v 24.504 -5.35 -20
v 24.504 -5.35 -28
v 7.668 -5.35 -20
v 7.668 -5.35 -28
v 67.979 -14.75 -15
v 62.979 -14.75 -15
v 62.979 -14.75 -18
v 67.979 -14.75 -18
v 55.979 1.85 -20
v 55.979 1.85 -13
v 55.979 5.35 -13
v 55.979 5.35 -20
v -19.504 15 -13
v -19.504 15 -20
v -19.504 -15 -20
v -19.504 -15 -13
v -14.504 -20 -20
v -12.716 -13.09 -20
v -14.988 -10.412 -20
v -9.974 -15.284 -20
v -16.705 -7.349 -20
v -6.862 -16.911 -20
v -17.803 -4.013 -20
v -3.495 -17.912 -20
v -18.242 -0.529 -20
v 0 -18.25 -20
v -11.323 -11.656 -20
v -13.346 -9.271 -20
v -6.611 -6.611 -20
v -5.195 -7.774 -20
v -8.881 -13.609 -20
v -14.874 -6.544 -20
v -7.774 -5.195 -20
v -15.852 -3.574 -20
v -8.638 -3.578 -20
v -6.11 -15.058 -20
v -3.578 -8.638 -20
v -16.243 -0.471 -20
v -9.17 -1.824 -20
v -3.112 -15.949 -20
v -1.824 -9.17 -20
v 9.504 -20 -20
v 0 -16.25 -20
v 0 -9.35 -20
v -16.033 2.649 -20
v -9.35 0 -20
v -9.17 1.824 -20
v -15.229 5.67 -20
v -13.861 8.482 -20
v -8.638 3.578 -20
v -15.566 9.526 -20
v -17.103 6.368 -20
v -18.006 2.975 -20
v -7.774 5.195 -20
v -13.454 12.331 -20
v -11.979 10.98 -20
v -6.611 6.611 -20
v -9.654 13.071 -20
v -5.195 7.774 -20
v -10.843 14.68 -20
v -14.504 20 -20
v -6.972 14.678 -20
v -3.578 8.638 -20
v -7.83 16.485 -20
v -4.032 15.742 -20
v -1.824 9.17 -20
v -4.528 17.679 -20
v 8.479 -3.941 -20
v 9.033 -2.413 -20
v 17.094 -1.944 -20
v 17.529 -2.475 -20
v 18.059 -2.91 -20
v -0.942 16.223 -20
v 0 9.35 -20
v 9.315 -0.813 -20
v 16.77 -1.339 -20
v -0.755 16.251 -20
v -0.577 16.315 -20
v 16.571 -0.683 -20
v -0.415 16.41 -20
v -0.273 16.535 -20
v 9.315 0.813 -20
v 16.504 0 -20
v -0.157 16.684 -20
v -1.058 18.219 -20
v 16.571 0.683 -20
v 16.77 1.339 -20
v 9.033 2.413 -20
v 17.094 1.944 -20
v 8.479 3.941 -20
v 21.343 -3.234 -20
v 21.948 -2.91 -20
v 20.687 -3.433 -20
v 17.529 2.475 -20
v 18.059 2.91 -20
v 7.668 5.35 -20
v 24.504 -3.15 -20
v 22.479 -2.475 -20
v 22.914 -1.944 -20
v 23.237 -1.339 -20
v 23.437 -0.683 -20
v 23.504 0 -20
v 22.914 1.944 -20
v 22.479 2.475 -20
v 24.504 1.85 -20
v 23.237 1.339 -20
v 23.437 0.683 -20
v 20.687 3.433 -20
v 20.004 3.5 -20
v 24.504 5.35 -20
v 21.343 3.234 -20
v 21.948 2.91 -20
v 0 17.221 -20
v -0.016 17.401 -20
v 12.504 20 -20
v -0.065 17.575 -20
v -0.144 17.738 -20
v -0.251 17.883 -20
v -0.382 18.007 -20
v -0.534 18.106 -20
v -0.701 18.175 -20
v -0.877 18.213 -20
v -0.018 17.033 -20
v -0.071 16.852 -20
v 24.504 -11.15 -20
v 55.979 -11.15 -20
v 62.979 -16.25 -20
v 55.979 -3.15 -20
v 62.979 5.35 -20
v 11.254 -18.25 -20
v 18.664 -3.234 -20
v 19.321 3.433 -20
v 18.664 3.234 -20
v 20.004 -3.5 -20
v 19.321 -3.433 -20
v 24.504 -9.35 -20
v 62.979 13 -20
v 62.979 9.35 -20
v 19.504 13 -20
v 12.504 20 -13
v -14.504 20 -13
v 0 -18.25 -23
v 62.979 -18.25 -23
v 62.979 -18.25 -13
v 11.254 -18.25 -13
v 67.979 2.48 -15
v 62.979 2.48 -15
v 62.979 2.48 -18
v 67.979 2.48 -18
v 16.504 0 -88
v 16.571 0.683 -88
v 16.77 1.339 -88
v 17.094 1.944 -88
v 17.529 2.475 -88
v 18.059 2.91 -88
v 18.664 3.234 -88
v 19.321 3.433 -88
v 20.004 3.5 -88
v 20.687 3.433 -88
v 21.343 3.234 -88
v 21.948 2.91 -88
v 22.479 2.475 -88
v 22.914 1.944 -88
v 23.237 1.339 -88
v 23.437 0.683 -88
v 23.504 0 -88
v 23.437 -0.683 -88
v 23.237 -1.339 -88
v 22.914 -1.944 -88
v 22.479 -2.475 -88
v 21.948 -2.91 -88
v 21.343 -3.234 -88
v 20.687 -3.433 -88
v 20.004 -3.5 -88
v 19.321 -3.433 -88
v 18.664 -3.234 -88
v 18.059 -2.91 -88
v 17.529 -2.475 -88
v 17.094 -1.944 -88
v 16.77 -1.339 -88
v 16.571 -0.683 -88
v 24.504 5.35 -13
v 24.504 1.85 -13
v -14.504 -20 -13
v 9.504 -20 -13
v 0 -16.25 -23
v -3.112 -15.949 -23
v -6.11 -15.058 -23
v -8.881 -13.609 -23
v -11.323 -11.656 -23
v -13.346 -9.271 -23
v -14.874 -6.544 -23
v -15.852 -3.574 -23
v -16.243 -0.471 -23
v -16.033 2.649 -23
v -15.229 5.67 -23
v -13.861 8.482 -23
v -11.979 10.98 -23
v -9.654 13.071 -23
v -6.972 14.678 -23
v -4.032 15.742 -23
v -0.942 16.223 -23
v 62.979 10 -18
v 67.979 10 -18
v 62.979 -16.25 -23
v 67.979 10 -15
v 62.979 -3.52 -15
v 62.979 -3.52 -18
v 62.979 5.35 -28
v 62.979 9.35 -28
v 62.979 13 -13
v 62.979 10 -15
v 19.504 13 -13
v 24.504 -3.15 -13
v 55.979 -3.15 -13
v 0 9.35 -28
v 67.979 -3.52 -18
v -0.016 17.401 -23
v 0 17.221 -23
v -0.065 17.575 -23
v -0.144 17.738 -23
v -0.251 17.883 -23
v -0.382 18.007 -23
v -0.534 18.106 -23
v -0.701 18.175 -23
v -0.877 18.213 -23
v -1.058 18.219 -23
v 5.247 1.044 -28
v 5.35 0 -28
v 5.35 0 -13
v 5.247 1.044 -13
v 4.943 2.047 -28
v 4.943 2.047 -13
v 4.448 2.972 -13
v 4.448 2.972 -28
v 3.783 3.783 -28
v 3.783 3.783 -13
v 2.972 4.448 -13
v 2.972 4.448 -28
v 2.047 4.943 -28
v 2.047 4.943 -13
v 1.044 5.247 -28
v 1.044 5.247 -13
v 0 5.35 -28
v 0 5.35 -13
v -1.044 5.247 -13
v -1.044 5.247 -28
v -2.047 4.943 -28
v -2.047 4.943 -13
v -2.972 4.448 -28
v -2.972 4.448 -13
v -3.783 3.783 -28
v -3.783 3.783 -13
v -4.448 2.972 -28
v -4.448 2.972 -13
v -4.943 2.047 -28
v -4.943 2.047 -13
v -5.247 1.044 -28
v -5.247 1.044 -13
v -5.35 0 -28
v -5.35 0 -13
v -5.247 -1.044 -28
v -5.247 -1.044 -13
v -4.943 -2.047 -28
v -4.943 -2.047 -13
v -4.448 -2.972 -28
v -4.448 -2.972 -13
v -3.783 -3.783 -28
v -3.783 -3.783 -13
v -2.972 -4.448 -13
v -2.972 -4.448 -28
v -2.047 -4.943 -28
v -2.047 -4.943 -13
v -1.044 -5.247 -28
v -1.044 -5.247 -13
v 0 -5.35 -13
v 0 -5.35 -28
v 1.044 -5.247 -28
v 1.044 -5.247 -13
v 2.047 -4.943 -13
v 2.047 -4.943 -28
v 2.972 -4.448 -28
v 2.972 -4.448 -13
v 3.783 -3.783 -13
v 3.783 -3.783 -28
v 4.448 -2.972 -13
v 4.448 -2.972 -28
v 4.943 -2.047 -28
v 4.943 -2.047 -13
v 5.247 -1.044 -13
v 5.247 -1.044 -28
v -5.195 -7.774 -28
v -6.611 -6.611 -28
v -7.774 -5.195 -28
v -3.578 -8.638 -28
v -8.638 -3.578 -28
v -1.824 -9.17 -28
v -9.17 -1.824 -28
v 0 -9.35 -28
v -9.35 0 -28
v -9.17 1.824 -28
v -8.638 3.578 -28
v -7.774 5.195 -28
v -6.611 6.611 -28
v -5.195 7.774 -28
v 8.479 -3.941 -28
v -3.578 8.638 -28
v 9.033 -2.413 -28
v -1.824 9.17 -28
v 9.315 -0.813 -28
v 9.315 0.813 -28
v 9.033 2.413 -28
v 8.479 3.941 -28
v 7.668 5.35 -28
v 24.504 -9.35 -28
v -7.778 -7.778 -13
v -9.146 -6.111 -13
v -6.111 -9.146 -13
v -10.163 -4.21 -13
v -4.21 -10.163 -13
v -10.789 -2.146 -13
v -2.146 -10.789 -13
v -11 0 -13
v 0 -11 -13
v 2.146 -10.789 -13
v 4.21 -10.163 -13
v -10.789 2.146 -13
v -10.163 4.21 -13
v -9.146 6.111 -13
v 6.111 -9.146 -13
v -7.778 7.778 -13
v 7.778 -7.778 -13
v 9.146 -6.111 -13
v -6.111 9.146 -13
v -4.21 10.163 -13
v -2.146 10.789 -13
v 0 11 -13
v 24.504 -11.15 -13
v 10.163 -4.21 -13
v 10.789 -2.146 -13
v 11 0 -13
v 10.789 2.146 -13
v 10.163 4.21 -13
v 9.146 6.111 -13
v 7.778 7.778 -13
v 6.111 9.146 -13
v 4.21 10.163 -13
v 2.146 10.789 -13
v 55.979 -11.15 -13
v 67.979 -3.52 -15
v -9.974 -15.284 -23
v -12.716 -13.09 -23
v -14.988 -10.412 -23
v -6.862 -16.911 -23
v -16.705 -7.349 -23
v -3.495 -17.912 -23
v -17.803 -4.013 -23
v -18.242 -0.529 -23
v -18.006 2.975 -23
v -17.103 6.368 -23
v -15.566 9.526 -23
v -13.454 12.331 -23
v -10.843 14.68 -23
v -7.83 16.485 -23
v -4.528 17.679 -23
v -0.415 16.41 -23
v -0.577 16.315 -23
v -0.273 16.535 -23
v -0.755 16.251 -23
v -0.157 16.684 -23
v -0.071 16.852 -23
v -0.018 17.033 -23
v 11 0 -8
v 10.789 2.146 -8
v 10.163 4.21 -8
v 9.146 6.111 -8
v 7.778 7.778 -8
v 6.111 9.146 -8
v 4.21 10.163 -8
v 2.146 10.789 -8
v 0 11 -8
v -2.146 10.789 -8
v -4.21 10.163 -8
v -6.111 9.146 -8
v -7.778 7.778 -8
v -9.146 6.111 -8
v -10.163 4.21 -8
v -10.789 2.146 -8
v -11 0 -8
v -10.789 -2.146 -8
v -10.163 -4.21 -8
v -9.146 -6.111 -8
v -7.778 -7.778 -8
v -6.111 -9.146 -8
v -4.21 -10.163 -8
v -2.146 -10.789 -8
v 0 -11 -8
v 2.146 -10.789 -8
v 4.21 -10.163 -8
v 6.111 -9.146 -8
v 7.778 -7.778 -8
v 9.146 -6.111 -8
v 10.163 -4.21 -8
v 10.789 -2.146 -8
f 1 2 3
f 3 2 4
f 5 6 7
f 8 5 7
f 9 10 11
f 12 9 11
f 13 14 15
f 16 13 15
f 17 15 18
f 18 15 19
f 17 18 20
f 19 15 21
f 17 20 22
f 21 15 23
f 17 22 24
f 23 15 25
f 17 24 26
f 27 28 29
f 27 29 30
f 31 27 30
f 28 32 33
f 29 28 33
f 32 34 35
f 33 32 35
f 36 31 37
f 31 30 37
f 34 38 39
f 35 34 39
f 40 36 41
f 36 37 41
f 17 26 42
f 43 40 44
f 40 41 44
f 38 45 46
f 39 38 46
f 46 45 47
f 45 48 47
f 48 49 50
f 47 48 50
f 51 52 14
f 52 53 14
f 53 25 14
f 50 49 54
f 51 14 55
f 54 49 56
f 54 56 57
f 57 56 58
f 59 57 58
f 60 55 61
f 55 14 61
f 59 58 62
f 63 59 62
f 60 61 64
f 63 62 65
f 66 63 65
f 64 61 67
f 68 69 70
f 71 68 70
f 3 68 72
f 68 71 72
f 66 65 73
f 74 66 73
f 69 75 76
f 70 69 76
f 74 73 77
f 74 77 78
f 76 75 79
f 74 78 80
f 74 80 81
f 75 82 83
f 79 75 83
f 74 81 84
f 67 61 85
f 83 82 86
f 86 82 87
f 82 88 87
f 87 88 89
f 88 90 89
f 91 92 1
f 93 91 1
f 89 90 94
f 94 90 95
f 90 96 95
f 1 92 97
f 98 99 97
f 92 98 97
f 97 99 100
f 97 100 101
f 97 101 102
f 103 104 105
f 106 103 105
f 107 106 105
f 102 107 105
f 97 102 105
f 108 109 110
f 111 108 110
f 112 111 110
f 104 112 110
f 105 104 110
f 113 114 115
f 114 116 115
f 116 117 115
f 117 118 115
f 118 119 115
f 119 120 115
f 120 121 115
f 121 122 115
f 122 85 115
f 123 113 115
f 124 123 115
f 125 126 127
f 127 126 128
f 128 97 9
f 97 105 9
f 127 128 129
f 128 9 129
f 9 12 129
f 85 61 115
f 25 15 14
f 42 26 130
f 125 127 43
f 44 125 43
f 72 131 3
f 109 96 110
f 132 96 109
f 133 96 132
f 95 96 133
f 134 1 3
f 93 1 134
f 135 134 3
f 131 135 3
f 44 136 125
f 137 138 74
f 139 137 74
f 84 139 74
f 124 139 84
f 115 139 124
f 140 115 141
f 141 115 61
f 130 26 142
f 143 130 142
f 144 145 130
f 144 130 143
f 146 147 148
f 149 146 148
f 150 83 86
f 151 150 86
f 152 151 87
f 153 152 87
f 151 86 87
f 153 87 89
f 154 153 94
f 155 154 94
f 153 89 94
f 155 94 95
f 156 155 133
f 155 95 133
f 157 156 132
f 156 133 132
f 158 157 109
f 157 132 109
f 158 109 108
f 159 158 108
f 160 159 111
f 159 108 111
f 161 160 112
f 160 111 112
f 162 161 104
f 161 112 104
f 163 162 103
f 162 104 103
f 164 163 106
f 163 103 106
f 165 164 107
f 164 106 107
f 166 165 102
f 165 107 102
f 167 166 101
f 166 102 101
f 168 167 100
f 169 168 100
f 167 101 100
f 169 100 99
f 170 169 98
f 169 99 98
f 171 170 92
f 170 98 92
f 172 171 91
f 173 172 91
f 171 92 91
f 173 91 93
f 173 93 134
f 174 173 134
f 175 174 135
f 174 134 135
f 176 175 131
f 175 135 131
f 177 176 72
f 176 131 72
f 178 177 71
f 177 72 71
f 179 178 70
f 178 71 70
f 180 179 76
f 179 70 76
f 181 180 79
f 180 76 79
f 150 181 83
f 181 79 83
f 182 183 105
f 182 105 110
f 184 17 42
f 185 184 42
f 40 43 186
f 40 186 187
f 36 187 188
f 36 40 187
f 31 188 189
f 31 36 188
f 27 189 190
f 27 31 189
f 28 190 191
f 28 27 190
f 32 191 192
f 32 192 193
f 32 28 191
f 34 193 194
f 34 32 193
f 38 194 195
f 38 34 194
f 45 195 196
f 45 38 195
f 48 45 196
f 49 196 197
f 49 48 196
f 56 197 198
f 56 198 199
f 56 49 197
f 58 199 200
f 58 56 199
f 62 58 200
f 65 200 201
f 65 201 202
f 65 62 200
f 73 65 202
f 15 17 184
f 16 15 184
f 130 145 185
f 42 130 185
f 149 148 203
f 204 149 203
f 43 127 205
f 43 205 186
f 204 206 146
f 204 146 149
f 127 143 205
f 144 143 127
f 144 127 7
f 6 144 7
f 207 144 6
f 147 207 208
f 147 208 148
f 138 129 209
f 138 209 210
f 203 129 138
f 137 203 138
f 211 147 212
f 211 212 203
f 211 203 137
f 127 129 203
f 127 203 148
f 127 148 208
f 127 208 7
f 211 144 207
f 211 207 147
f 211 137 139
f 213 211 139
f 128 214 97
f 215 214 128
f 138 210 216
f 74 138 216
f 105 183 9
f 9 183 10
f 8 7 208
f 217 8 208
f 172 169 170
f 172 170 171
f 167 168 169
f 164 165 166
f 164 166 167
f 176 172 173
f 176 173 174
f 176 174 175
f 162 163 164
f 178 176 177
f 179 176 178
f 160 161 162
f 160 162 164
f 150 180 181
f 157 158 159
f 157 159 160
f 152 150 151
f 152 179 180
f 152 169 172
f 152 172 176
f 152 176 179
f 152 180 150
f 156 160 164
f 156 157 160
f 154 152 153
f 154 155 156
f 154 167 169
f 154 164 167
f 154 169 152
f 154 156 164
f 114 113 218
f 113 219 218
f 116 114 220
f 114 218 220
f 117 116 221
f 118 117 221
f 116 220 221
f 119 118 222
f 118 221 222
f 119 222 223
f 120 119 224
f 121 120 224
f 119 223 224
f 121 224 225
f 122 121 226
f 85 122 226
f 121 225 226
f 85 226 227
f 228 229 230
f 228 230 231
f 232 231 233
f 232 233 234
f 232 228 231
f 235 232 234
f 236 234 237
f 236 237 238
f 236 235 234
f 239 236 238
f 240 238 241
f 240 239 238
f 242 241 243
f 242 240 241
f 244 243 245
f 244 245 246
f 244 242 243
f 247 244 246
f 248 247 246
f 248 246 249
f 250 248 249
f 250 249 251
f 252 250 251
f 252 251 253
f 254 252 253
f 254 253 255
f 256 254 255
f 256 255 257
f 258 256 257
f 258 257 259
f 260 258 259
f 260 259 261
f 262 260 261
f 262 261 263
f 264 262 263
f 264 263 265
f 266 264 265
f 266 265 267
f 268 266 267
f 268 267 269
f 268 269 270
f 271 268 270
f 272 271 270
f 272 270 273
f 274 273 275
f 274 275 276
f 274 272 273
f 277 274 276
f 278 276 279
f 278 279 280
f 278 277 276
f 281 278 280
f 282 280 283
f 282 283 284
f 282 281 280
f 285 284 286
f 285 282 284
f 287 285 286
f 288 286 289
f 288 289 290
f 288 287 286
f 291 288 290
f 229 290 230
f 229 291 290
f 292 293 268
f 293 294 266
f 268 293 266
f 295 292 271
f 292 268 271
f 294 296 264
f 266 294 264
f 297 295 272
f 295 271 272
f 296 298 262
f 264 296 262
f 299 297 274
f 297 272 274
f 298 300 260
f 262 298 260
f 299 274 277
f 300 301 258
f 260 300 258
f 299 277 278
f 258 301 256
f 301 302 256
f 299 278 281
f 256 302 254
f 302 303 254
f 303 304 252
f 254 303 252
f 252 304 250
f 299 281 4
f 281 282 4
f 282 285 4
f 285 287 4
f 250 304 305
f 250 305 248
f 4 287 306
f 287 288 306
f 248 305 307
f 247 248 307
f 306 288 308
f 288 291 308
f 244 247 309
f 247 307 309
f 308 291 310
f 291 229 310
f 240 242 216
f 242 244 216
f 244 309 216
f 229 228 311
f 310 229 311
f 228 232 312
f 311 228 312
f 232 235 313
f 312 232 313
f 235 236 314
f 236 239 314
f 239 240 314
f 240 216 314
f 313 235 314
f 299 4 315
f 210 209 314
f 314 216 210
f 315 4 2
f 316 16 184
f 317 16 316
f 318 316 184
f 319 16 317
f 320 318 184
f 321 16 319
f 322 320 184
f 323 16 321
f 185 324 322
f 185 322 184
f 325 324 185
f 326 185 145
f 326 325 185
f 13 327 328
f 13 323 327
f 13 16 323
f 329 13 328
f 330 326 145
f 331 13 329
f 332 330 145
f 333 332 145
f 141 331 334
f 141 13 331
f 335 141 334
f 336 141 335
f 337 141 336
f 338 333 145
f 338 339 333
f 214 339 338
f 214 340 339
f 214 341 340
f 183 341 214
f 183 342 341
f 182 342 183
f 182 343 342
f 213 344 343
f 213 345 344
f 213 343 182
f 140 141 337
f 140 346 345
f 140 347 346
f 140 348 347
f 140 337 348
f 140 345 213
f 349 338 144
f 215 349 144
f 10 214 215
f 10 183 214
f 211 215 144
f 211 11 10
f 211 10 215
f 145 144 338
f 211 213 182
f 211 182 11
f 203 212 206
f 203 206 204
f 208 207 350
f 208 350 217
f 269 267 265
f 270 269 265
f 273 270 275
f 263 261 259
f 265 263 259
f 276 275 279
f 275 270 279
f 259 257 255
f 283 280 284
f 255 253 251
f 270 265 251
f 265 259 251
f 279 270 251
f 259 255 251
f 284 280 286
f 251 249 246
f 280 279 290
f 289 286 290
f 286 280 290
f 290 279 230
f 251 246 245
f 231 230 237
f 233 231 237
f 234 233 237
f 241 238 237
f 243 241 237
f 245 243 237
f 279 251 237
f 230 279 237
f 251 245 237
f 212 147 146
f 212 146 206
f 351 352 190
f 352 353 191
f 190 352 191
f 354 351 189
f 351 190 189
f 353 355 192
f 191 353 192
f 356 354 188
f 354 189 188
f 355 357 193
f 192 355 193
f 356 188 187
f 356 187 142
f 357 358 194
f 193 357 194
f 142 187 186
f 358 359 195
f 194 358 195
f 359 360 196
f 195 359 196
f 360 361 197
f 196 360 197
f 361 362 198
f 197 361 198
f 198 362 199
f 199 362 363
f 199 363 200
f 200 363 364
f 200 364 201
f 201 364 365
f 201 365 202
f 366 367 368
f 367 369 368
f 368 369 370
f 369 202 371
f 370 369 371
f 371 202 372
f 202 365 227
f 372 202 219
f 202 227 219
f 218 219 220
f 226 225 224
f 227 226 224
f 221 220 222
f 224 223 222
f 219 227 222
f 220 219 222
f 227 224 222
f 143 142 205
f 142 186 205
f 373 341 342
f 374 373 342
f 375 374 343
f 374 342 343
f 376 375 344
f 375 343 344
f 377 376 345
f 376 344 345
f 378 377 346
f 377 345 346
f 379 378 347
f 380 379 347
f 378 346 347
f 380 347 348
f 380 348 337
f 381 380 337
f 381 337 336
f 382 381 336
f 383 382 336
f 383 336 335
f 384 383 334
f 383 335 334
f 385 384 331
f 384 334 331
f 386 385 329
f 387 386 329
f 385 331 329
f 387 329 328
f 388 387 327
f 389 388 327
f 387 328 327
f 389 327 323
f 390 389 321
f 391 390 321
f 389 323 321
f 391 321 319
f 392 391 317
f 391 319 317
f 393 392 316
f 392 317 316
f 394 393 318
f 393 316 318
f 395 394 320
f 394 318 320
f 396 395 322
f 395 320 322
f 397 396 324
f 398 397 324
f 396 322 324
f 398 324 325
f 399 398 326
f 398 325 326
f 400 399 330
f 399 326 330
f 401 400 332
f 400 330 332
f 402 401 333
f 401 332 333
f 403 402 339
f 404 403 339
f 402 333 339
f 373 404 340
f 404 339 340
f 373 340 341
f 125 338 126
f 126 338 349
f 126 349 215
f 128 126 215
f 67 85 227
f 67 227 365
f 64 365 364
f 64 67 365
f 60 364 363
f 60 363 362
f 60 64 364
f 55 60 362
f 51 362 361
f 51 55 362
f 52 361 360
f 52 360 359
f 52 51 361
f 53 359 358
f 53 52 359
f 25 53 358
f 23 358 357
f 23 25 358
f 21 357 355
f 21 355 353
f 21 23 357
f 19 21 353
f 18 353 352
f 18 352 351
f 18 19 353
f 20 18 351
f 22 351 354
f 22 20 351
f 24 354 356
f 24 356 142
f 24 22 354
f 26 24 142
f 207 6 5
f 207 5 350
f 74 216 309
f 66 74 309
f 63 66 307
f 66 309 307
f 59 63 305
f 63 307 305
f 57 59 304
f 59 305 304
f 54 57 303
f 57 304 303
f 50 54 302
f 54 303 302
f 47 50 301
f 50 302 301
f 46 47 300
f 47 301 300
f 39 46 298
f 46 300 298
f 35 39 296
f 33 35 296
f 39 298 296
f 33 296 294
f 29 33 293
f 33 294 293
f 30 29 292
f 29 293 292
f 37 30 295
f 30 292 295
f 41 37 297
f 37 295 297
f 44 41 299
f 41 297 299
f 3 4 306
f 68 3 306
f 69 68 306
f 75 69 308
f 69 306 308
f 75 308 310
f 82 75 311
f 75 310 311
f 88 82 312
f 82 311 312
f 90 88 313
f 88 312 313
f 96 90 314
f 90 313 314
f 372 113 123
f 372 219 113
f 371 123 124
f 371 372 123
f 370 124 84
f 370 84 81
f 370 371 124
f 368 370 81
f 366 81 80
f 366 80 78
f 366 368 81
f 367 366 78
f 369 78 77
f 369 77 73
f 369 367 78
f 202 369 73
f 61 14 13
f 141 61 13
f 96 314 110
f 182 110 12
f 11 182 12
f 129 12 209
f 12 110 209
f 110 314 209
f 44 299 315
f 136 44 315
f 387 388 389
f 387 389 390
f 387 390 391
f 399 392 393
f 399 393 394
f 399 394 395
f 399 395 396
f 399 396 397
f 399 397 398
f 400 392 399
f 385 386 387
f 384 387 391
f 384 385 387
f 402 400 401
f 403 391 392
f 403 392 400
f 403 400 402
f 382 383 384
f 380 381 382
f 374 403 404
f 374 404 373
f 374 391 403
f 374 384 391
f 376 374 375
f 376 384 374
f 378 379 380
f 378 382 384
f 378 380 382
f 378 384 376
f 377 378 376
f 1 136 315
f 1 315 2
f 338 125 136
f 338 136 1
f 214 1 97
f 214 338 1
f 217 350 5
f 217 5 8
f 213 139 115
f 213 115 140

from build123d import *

# Parameters (mm, degrees)
SKETCH1_R               = 5.35
BOSS_EXTRUDE2_DEPTH     = 7
BOSS_EXTRUDE3_START     = 8
SKETCH3_R               = 5.35
BOSS_EXTRUDE3_DEPTH     = 8
BOSS_EXTRUDE4_DEPTH     = 3
FILLET1_R               = 1
CHAMFER1_SIZE           = 10
CHAMFER2_SIZE           = 5
CUT_EXTRUDE1_DEPTH      = 67.560662475
CUT_EXTRUDE1_DEPTH_BACK = 67.560662475
SKETCH5_W               = 31.474956737
SKETCH5_H               = 3.5
SKETCH5_H_2             = 8
CHAMFER3_SIZE           = 7
SKETCH6_R               = 11
BOSS_EXTRUDE5_DEPTH     = 5
SKETCH8_W               = 3
SKETCH8_H               = 7.519820499
SKETCH8_H_2             = 11.230179501
BOSS_EXTRUDE6_DEPTH     = 5
SKETCH9_R               = 3.5
BOSS_EXTRUDE7_DEPTH     = 68
CUT_EXTRUDE2_REACH      = 124.259
SKETCH10_W              = 8
SKETCH10_H              = 4


# Some blends are built 0.0001 mm under size
with BuildPart() as part:
    # Sketch1 → Boss-Extrude2 (new body)
    with BuildSketch(Plane.XY):
        Polygon((-19.503784034, -20), (19.503784034, -20), (19.503784034, -18.25), (62.978740771, -18.25), (62.978740771, 13), (19.503784034, 13), (19.503784034, 20), (-19.503784034, 20), align=None)
        Circle(SKETCH1_R, mode=Mode.SUBTRACT)
    extrude(amount=-BOSS_EXTRUDE2_DEPTH)

    # Sketch3 → Boss-Extrude3 (add)
    with BuildSketch(Plane.XY.offset(BOSS_EXTRUDE3_START)):
        with BuildLine():
            Line((7.668115805, 5.35), (62.978740771, 5.35))
            Line((62.978740771, 5.35), (62.978740771, 9.35))
            Line((62.978740771, 9.35), (0, 9.35))
            ThreePointArc((0, 9.35), (-9.35, 0), (0, -9.35))
            Line((0, -9.35), (62.978740771, -9.35))
            Line((62.978740771, -9.35), (62.978740771, -5.35))
            Line((62.978740771, -5.35), (7.668115805, -5.35))
            ThreePointArc((7.668115805, -5.35), (9.35, 0), (7.668115805, 5.35))
        make_face()
        Circle(SKETCH3_R, mode=Mode.SUBTRACT)
    extrude(amount=-BOSS_EXTRUDE3_DEPTH)

    # Sketch4 → Boss-Extrude4 (add)
    with BuildSketch(Plane.XY):
        with BuildLine():
            Line((0, -18.25), (62.978740771, -18.25))
            Line((62.978740771, -18.25), (62.978740771, -16.25))
            Line((62.978740771, -16.25), (8.306623863, -16.25))
            Line((8.306623863, -16.25), (0, -16.25))
            ThreePointArc((0, -16.25), (-16.25, 0), (0, 16.25))
            Line((0, 16.25), (0, 18.25))
            ThreePointArc((0, 18.25), (-18.25, 0), (0, -18.25))
        make_face()
    extrude(amount=BOSS_EXTRUDE4_DEPTH)

    # Fillet1
    fillet1_edges = [part.edges().sort_by_distance(p)[0] for p in [
        (0, 16.25, 1.5),
        (0, 18.25, 1.5),
    ]]
    fillet(fillet1_edges, radius=FILLET1_R - 0.0001)  # a hair under: the kernel refuses the full size

    # Chamfer1
    # the kernel refuses this chamfer: 10 mm, written as the material it takes off along each edge
    with BuildSketch(Plane(origin=(19.503784034, -20, 25.71682988), x_dir=(0.027495876610586317, 0.9996219169112968, 0), z_dir=(0, 0, -1))) as chamfer1_piece_1_section:
        Polygon((CHAMFER1_SIZE * 0.999621916911, -CHAMFER1_SIZE * 0.0274958766106), (-CHAMFER1_SIZE * 0.0274958766106, -CHAMFER1_SIZE * 0.999621916911), (0, 0), align=None)
    chamfer1_piece_1 = extrude(amount=58.433659759, mode=Mode.PRIVATE)
    chamfer1_piece_1 = split(chamfer1_piece_1, bisect_by=Plane(origin=(14.814200223, -18.25, -3.5), z_dir=(0, -1, 0)), keep=Keep.TOP, mode=Mode.PRIVATE)
    add(chamfer1_piece_1, mode=Mode.SUBTRACT)

    # Chamfer2
    chamfer2_edges = [part.edges().sort_by_distance(p)[0] for p in [
        (-19.503784034, -20, -3.5),
        (-19.503784034, 20, -3.5),
    ]]
    chamfer(chamfer2_edges, length=CHAMFER2_SIZE)

    # Sketch5 → Cut-Extrude1 (cut, two sides: drawn at the far end of the back side and taken through both)
    with BuildSketch(Plane.XY.offset(-CUT_EXTRUDE1_DEPTH_BACK)):
        with Locations((40.241262403, 3.6)):
            Rectangle(SKETCH5_W, SKETCH5_H)
        with Locations((40.241262403, -7.15)):
            Rectangle(SKETCH5_W, SKETCH5_H_2)
    extrude(amount=CUT_EXTRUDE1_DEPTH + CUT_EXTRUDE1_DEPTH_BACK, mode=Mode.SUBTRACT)

    # Chamfer3
    chamfer3_edges = [part.edges().sort_by_distance(p)[0] for p in [
        (19.503784034, 20, -3.5),
    ]]
    chamfer(chamfer3_edges, length=CHAMFER3_SIZE - 0.0001)  # a hair under: the kernel refuses the full size


with BuildPart() as body_2:
    # Mirror9: mirrored copy
    add(part.part.mirror(Plane.XY.offset(-10)))

    # Sketch6 → Boss-Extrude5 (add)
    with BuildSketch(Plane.XY.offset(-13)):
        Circle(SKETCH6_R)
    extrude(amount=BOSS_EXTRUDE5_DEPTH)

    # Sketch8 → Boss-Extrude6 (add)
    with BuildSketch(Plane(origin=(62.978740771, 0, 0), x_dir=(0, 0, -1), z_dir=(1, 0, 0))):
        with Locations((16.5, 6.240089751)):
            Rectangle(SKETCH8_W, SKETCH8_H)
        with Locations((16.5, -9.13491025)):
            Rectangle(SKETCH8_W, SKETCH8_H_2)
    extrude(amount=BOSS_EXTRUDE6_DEPTH)

    # Sketch9 → Boss-Extrude7 (add)
    with BuildSketch(Plane(origin=(0, 0, -20), x_dir=(-1, 0, 0), z_dir=(0, 0, -1))):
        with Locations((-20.003784034, 0)):
            Circle(SKETCH9_R)
    extrude(amount=BOSS_EXTRUDE7_DEPTH)

    # Sketch10 → Cut-Extrude2 (cut, up to next)
    with BuildSketch(Plane(origin=(62.978740771, 0, 0), x_dir=(0, 0, -1), z_dir=(1, 0, 0)), mode=Mode.PRIVATE) as cut_extrude2_sk1:
        with Locations((24, -7.35)):
            Rectangle(SKETCH10_W, SKETCH10_H)
    cut_extrude2_tool1 = extrude(cut_extrude2_sk1.sketch, amount=-CUT_EXTRUDE2_REACH, mode=Mode.PRIVATE) & body_2.part
    add(cut_extrude2_tool1.solids().sort_by_distance((62.978741, -7.35, -24))[0], mode=Mode.SUBTRACT)


solid = body_2.part
